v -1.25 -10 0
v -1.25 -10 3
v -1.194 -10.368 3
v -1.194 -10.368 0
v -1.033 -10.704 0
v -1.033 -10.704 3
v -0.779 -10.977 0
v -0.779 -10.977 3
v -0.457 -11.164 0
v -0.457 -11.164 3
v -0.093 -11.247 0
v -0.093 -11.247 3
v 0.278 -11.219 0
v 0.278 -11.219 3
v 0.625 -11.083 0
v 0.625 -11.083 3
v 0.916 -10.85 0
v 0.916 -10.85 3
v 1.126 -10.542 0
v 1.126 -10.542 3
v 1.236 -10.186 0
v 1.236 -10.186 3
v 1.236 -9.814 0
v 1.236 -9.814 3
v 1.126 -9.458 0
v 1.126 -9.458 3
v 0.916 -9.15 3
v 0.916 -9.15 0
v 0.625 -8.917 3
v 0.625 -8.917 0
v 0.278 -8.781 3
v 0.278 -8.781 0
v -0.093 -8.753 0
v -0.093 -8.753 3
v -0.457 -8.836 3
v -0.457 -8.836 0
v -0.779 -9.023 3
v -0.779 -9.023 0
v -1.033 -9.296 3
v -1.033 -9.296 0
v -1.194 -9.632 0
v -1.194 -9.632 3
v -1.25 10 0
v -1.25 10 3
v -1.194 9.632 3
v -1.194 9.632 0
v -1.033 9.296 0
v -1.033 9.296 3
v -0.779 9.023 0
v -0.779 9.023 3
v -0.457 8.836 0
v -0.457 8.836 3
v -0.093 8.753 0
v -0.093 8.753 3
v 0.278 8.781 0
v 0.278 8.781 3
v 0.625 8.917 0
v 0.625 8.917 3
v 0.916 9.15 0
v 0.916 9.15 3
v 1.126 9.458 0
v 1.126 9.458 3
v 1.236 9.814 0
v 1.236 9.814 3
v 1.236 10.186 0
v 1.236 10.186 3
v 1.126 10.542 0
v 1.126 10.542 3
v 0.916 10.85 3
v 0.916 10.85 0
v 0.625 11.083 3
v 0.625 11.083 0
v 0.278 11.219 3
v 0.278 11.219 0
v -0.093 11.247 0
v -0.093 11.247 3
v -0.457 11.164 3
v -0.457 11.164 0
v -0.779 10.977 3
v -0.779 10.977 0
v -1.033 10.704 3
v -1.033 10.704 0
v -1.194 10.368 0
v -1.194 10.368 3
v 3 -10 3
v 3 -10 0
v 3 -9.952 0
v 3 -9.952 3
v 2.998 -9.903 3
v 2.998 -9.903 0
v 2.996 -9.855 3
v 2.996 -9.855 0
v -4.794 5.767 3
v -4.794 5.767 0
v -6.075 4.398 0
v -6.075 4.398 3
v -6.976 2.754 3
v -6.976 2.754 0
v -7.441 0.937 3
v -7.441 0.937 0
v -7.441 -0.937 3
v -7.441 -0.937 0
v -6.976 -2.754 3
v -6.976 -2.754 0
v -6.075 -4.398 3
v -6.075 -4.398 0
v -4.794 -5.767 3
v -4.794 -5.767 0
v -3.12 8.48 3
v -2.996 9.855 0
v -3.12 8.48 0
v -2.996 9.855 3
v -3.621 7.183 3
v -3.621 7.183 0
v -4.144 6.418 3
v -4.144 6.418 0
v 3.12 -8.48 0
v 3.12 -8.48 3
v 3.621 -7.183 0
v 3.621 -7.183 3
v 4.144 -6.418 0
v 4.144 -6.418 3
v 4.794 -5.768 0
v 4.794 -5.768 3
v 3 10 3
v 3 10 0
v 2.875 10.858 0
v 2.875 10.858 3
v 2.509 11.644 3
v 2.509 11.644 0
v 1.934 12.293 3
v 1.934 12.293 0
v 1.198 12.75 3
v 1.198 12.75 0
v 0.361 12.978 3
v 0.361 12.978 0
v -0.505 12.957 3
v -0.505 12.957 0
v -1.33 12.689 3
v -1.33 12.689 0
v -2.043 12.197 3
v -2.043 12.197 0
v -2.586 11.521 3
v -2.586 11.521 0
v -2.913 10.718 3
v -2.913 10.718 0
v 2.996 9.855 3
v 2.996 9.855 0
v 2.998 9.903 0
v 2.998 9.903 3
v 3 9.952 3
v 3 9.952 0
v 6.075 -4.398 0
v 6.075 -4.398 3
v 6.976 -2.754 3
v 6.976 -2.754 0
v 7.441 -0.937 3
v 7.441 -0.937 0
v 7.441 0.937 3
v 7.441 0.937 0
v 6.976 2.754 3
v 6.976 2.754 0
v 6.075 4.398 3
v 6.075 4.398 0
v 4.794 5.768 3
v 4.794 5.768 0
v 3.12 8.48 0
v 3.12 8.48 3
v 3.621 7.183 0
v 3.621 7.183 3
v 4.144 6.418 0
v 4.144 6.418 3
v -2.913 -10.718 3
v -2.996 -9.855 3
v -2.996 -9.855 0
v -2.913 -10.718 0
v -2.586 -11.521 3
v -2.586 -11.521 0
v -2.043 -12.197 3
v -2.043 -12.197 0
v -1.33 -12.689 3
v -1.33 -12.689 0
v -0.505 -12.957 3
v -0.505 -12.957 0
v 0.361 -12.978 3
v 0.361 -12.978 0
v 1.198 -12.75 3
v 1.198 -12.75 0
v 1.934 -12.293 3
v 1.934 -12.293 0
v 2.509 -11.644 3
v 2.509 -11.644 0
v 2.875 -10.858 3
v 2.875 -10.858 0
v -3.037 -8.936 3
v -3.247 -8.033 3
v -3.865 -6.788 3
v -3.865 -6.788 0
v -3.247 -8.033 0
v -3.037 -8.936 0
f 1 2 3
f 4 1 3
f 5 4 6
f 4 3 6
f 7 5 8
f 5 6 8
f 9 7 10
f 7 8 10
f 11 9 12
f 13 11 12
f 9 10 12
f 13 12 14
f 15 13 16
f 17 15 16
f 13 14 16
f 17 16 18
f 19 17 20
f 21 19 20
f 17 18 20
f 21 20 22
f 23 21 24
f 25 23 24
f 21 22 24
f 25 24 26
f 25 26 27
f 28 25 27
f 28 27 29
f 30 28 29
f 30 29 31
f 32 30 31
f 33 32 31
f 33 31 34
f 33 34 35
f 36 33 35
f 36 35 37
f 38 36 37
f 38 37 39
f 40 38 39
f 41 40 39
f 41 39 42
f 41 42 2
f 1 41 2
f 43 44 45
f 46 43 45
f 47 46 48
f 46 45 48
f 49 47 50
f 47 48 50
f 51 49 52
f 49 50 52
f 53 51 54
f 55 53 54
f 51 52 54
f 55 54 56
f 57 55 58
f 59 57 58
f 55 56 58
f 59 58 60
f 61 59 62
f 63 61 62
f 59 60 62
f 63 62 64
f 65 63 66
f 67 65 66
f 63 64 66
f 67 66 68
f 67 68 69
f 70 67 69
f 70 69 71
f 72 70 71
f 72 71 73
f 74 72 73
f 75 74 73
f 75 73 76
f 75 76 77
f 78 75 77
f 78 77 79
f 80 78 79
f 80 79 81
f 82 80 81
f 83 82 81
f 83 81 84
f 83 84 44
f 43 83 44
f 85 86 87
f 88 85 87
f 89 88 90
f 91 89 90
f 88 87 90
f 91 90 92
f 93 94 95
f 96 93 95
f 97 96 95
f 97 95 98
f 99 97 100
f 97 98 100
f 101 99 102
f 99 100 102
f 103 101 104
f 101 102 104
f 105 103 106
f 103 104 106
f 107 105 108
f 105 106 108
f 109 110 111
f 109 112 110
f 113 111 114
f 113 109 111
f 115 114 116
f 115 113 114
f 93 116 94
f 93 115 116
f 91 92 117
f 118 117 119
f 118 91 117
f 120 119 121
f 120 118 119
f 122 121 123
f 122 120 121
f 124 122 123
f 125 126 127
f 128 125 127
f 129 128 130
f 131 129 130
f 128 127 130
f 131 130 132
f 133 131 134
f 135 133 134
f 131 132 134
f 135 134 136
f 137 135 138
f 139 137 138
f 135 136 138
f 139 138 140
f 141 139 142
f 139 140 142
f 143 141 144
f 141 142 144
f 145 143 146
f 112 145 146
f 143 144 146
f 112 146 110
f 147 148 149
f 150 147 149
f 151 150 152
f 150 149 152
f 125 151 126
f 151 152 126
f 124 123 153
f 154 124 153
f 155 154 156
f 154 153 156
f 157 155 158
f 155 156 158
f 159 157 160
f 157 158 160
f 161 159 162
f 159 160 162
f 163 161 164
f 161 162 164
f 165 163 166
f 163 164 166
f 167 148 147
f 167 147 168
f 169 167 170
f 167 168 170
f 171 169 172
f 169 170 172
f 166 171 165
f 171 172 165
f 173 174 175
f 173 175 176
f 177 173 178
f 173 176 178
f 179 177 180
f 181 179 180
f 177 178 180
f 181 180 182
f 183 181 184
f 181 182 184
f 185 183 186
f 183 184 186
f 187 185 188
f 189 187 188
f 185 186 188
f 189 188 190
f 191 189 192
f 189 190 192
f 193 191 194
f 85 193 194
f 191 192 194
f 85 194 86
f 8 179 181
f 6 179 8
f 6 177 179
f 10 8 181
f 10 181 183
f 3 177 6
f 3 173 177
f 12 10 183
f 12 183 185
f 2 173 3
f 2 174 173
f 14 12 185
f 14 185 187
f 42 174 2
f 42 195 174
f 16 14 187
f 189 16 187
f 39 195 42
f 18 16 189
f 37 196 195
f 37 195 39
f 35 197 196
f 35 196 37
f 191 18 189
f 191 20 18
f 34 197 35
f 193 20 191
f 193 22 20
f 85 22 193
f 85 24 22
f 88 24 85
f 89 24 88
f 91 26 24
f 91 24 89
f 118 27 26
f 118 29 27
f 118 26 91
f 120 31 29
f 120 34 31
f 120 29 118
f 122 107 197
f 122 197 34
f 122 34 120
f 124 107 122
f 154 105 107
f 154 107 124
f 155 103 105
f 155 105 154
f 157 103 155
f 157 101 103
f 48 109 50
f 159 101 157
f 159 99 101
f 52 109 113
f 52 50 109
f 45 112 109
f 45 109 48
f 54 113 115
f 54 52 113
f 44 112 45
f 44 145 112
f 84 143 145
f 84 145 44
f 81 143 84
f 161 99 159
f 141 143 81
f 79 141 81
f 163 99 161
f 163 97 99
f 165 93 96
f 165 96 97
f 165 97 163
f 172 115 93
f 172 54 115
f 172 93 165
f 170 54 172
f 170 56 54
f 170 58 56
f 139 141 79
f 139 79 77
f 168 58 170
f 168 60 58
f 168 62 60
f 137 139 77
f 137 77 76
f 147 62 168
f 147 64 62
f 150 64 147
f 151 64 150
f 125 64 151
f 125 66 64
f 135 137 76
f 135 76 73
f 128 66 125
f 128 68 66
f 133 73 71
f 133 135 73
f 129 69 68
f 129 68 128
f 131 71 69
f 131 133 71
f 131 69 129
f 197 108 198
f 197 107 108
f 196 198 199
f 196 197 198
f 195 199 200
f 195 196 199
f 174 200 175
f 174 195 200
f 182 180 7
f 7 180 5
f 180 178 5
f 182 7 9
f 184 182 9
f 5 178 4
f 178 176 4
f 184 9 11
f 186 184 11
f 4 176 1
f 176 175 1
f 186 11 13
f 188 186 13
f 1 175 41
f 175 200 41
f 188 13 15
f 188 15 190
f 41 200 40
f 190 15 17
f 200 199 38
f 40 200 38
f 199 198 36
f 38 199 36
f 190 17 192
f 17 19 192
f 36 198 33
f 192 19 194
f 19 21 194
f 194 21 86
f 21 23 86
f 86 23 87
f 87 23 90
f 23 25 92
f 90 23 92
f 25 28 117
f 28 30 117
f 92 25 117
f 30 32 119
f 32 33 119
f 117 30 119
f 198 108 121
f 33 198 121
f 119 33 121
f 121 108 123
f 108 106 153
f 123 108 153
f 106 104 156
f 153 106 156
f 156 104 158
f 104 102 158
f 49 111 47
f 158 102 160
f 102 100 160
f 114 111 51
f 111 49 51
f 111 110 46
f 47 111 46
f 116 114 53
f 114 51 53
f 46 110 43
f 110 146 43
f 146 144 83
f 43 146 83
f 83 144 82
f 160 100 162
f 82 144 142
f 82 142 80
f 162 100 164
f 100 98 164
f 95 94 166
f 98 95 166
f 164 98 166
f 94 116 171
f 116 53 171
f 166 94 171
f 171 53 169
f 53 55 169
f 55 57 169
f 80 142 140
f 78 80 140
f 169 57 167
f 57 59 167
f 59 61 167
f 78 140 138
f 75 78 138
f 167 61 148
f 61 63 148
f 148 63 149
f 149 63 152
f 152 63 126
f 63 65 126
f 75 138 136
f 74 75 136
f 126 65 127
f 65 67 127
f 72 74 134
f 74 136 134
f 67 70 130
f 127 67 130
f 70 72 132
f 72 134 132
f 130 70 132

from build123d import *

# Parameters (mm, degrees)
F1_DEPTH = 3
F2_R     = 5
F3_D     = 2.5


with BuildPart() as f1:
    # F0 (on Top) → F1 (new body)
    with BuildSketch(Plane.XY):
        with BuildLine():
            ThreePointArc((1.4295431963, 7.3625), (2.5776568419, 8.4651758389), (3, 10))
            ThreePointArc((3, 10), (-1.5348241611, 12.5776568419), (-1.4295431963, 7.3625))
            ThreePointArc((-1.4295431963, 7.3625), (0, 7.5), (1.4295431963, 7.3625))
        make_face()
        with BuildLine():
            ThreePointArc((1.4295431963, -7.3625), (0, -7), (-1.4295431963, -7.3625))
            ThreePointArc((-1.4295431963, -7.3625), (0, -7.5), (1.4295431963, -7.3625))
        make_face()
        with BuildLine():
            ThreePointArc((1.4295431963, 7.3625), (0, 7), (-1.4295431963, 7.3625))
            ThreePointArc((-1.4295431963, 7.3625), (-7.5, 0), (-1.4295431963, -7.3625))
            ThreePointArc((-1.4295431963, -7.3625), (0, -7), (1.4295431963, -7.3625))
            ThreePointArc((1.4295431963, -7.3625), (5.7866905037, -4.7711857032), (7.5, 0))
            ThreePointArc((7.5, 0), (5.7866905037, 4.7711857032), (1.4295431963, 7.3625))
        make_face()
        with BuildLine():
            ThreePointArc((1.4295431963, 7.3625), (0, 7.5), (-1.4295431963, 7.3625))
            ThreePointArc((-1.4295431963, 7.3625), (0, 7), (1.4295431963, 7.3625))
        make_face()
        with BuildLine():
            ThreePointArc((1.4295431963, -7.3625), (0, -7.5), (-1.4295431963, -7.3625))
            ThreePointArc((-1.4295431963, -7.3625), (-1.5348241611, -12.5776568419), (3, -10))
            ThreePointArc((3, -10), (2.5776568419, -8.4651758389), (1.4295431963, -7.3625))
        make_face()
    extrude(amount=F1_DEPTH)

    # F2
    f2_edges = [f1.edges().sort_by_distance(p)[0] for p in [
        (-1.429543, -7.3625, 1.5),
        (1.429543, -7.3625, 1.5),
        (-1.429543, 7.3625, 1.5),
        (1.429543, 7.3625, 1.5),
    ]]
    fillet(f2_edges, radius=F2_R)

    # F3 (through all)
    with Locations(Plane(origin=(0, 0, 0), x_dir=(1, 0, 0), z_dir=(0, 0, -1))):
        with Locations((0, 10), (0, -10)):
            Hole(F3_D / 2)


solid = f1.part
